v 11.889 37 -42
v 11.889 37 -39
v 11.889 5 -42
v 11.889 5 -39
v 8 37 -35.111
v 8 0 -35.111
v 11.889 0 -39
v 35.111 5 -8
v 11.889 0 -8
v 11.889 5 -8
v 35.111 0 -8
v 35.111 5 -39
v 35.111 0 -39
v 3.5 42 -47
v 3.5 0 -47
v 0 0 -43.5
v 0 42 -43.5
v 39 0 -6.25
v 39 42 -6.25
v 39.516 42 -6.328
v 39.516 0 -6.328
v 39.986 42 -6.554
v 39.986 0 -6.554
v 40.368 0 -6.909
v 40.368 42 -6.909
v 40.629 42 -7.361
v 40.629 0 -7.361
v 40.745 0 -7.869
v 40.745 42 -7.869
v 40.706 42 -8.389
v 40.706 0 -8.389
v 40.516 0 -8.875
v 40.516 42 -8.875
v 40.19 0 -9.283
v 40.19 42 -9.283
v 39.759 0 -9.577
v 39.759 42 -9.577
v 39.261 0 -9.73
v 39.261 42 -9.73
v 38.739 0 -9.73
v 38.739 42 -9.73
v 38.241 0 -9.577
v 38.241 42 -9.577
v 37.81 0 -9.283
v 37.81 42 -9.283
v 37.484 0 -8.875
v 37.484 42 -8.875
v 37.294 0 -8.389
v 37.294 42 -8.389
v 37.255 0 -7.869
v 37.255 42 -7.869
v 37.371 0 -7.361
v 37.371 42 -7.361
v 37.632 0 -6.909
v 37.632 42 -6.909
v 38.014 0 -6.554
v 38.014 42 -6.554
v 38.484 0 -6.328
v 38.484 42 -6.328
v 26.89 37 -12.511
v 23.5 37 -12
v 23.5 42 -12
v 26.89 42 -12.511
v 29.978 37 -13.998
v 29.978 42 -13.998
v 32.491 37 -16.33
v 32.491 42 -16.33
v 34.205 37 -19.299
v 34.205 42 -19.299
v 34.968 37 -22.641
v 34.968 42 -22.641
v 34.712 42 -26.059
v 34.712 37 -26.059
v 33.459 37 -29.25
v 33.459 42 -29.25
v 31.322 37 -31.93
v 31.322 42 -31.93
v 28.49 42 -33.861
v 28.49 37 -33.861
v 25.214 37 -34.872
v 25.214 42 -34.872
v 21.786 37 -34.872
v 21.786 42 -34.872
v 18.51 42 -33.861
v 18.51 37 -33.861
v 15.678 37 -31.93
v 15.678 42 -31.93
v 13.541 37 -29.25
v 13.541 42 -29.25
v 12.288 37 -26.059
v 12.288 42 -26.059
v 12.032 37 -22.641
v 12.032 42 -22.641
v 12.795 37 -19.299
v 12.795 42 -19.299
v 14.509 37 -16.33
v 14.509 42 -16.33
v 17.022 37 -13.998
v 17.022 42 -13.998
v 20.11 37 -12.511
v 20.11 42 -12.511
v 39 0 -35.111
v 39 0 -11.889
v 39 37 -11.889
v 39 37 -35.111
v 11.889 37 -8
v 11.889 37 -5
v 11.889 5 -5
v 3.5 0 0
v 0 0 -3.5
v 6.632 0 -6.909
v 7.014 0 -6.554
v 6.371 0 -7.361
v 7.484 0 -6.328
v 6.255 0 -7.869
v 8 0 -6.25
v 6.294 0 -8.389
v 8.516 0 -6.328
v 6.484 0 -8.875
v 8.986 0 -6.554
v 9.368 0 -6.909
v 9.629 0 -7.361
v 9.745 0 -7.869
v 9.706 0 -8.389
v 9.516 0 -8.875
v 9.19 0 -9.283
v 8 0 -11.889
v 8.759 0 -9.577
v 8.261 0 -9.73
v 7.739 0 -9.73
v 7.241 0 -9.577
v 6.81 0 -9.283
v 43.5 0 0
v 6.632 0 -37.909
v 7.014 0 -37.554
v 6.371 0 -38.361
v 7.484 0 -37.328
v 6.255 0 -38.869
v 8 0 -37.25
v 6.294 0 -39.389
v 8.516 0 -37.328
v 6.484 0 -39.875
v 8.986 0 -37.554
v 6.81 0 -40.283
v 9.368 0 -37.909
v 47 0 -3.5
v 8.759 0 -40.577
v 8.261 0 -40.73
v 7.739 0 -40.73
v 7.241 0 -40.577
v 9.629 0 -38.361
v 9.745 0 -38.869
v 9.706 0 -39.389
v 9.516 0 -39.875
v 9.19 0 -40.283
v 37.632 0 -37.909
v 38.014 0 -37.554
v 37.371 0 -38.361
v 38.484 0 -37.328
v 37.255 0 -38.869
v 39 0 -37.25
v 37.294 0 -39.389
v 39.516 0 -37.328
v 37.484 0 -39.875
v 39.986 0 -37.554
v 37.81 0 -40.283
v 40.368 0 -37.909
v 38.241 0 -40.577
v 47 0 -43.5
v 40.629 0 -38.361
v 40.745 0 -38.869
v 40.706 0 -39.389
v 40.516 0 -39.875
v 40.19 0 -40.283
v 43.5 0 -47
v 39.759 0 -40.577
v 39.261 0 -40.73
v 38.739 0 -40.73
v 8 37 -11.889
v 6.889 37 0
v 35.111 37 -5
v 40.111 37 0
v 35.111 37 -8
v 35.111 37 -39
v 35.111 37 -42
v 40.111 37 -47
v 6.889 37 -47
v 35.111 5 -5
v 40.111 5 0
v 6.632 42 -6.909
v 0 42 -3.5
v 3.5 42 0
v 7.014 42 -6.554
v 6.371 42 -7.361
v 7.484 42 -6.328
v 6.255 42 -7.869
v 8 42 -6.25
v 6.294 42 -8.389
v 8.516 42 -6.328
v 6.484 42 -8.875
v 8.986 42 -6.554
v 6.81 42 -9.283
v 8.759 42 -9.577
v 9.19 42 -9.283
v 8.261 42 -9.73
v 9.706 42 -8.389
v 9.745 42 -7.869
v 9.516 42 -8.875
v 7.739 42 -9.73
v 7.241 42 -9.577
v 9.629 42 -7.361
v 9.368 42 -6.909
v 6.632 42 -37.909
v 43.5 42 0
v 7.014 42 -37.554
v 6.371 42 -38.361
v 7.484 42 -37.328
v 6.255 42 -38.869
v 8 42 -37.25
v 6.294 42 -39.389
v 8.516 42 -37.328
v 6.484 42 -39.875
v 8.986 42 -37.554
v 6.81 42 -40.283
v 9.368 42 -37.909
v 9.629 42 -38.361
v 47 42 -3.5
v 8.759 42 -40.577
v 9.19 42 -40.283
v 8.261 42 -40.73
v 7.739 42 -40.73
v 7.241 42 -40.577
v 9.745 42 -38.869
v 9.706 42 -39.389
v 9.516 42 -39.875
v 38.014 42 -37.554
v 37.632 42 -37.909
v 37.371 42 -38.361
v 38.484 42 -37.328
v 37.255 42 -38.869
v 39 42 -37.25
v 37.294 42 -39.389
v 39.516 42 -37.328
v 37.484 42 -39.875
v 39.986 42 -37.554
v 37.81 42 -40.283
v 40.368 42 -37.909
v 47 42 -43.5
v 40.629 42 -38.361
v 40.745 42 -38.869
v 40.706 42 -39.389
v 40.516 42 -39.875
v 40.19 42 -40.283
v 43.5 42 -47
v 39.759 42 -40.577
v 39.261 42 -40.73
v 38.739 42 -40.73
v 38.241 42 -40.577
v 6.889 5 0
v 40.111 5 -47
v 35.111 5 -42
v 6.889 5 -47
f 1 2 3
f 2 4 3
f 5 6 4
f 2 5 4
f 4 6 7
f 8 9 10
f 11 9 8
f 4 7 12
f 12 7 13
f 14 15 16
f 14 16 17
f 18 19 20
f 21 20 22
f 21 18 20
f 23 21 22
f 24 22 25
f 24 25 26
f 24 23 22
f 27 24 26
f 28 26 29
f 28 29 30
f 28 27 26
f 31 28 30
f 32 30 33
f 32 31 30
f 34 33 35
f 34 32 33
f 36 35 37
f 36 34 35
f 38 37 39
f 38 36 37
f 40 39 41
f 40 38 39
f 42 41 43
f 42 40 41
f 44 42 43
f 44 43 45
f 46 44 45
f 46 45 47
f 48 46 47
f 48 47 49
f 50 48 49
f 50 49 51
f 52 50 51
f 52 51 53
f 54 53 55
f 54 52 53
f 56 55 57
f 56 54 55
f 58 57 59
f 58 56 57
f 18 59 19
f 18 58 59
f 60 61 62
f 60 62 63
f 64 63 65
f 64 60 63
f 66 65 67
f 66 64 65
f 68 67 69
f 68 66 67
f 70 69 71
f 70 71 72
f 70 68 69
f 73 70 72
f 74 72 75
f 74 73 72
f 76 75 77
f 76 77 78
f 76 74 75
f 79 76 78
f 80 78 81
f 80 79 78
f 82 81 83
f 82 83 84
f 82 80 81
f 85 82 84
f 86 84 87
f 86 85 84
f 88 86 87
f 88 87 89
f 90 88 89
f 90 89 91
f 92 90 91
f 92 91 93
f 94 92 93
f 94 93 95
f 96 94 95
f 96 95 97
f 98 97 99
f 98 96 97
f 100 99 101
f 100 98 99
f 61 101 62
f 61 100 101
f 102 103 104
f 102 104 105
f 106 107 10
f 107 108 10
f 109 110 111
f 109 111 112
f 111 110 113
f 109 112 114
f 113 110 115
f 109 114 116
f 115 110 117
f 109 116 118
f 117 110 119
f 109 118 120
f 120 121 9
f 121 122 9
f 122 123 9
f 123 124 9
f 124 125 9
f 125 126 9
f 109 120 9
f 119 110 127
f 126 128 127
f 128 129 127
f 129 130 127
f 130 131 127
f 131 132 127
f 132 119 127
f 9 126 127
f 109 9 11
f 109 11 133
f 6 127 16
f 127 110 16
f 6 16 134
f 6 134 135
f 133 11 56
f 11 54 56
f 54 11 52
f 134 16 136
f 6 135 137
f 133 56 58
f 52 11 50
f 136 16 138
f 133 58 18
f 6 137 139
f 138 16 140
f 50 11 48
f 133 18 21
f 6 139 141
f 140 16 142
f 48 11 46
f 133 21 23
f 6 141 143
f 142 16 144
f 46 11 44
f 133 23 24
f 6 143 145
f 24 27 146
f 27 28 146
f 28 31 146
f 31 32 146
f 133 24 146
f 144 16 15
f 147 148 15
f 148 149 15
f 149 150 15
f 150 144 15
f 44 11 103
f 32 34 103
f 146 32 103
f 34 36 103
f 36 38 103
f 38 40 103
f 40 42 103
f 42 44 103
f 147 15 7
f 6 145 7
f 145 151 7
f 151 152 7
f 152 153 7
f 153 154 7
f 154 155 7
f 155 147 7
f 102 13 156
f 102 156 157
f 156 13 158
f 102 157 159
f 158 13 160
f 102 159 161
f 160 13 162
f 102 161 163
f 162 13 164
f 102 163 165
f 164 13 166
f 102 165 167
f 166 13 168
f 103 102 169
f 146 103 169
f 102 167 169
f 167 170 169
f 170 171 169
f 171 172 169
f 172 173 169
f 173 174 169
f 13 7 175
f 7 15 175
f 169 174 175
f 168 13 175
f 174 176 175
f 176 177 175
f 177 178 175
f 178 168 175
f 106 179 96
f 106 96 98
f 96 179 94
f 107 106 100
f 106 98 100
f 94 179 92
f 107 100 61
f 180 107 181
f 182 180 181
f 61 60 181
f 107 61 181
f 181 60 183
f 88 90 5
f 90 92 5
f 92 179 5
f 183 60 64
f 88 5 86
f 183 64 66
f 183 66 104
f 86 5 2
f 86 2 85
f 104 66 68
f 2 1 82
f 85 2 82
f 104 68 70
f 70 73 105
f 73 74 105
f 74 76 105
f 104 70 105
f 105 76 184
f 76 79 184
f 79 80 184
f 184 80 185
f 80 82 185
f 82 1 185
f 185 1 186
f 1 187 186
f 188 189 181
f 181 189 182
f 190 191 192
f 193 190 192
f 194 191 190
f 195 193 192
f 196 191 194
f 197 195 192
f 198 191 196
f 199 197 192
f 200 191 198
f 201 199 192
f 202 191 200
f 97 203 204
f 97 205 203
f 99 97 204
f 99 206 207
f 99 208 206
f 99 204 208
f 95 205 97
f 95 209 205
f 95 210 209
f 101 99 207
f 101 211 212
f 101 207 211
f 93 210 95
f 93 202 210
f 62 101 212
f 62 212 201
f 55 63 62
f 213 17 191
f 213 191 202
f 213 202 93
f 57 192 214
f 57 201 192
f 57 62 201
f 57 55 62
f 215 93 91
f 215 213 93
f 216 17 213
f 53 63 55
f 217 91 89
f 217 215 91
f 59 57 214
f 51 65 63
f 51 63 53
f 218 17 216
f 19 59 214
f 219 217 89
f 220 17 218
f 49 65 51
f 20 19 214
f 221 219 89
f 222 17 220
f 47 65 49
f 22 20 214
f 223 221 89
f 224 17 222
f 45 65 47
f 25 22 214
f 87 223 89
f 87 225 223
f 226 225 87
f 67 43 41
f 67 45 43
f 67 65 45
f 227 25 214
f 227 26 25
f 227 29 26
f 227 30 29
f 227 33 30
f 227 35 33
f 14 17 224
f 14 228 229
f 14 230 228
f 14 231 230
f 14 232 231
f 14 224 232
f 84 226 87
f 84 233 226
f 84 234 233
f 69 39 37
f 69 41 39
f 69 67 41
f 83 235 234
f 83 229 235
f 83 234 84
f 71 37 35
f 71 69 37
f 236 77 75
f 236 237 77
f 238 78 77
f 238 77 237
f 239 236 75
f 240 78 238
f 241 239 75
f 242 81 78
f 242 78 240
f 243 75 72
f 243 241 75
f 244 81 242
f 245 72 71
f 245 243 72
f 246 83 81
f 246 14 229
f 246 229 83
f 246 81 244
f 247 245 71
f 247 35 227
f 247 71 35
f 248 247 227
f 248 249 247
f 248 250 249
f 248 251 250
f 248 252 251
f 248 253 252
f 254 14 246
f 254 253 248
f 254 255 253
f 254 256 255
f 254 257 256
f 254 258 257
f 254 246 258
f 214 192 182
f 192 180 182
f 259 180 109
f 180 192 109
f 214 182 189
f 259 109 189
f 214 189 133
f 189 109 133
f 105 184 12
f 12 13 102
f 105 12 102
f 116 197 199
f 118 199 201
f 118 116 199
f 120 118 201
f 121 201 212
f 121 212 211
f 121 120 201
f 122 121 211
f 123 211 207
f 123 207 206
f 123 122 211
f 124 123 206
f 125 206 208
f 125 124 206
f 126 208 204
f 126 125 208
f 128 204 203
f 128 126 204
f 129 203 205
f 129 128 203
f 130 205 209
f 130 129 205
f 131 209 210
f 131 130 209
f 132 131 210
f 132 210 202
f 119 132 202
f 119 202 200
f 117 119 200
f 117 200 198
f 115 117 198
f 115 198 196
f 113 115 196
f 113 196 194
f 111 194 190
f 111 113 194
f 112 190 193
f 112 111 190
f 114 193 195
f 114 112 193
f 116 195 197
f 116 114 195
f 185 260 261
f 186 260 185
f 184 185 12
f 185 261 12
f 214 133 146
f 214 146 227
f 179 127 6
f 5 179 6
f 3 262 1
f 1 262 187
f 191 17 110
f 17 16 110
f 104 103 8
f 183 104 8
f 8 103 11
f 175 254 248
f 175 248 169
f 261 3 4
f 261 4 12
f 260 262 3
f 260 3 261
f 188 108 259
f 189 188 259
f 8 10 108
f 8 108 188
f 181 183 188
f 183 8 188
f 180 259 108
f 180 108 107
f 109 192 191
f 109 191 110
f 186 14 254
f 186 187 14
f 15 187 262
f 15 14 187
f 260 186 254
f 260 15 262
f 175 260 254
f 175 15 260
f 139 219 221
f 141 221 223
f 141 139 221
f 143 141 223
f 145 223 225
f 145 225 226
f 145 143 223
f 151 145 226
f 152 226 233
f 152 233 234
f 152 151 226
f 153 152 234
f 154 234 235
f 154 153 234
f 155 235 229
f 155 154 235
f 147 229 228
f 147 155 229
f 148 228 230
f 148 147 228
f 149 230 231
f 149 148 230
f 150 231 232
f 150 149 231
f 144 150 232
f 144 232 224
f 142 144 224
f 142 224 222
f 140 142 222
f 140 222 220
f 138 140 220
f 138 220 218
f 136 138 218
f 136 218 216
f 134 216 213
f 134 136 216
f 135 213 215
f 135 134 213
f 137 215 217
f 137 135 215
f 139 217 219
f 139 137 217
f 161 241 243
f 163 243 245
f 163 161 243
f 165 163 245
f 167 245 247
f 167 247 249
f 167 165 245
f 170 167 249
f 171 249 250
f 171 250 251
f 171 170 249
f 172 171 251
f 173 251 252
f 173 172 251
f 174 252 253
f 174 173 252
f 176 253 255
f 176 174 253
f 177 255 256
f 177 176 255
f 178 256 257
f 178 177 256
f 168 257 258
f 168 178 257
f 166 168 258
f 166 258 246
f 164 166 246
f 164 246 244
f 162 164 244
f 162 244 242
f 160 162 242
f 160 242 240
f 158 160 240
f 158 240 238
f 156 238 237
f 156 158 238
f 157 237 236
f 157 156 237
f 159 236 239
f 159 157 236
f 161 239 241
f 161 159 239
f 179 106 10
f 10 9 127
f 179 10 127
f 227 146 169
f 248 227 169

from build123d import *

# Parameters (mm, degrees)
SKETCH1_R           = 1.75
SKETCH1_W           = 8
SKETCH1_H           = 23.221825406
SKETCH1_W_2         = 23.221825406
SKETCH1_H_2         = 8
BOSS_EXTRUDE1_DEPTH = 5
SKETCH1_3_R         = 1.75
SKETCH1_3_W         = 8
SKETCH1_3_H         = 23.221825406
BOSS_EXTRUDE2_DEPTH = 42
BOSS_EXTRUDE3_START = 37
SKETCH1_4_R         = 11.5
SKETCH1_4_W         = 23.221825406
SKETCH1_4_H         = 8
SKETCH1_4_R_2       = 1.75
SKETCH1_4_W_2       = 8
SKETCH1_4_H_2       = 23.221825406
BOSS_EXTRUDE3_DEPTH = 5
CHAMFER2_SIZE       = 5
CHAMFER4_SIZE       = 3.5


with BuildPart() as part:
    # Sketch1 → Boss-Extrude1 (new body)
    # profile 1 of 8: a face of its own
    with BuildSketch(Plane(origin=(0, 0, 0), x_dir=(1, 0, 0), z_dir=(0, 1, 0))):
        Polygon((0, 47), (0, 35.110912703), (8, 35.110912703), (11.889087297, 39), (11.889087297, 47), align=None)
        with Locations(Location((8, 39, 0), (0, 0, 270))):
            Circle(SKETCH1_R, mode=Mode.SUBTRACT)
    # profile 2 of 8: a face of its own
    with BuildSketch(Plane(origin=(0, 0, 0), x_dir=(1, 0, 0), z_dir=(0, 1, 0))):
        with Locations((4, 23.5)):
            Rectangle(SKETCH1_W, SKETCH1_H)
    # profile 3 of 8: a face of its own
    with BuildSketch(Plane(origin=(0, 0, 0), x_dir=(1, 0, 0), z_dir=(0, 1, 0))):
        Polygon((0, 11.889087297), (0, 0), (11.889087297, 0), (11.889087297, 8), (8, 11.889087297), align=None)
        with Locations(Location((8, 8, 0), (0, 0, 270))):
            Circle(SKETCH1_R, mode=Mode.SUBTRACT)
    # profile 4 of 8: a face of its own
    with BuildSketch(Plane(origin=(0, 0, 0), x_dir=(1, 0, 0), z_dir=(0, 1, 0))):
        with Locations((23.5, 4)):
            Rectangle(SKETCH1_W_2, SKETCH1_H_2)
    # profile 5 of 8: a face of its own
    with BuildSketch(Plane(origin=(0, 0, 0), x_dir=(1, 0, 0), z_dir=(0, 1, 0))):
        Polygon((35.110912703, 8), (35.110912703, 0), (47, 0), (47, 11.889087297), (39, 11.889087297), align=None)
        with Locations(Location((39, 8, 0), (0, 0, 270))):
            Circle(SKETCH1_R, mode=Mode.SUBTRACT)
    # profile 6 of 8: a face of its own
    with BuildSketch(Plane(origin=(0, 0, 0), x_dir=(1, 0, 0), z_dir=(0, 1, 0))):
        with Locations((43, 23.5)):
            Rectangle(SKETCH1_W, SKETCH1_H)
    # profile 7 of 8: a face of its own
    with BuildSketch(Plane(origin=(0, 0, 0), x_dir=(1, 0, 0), z_dir=(0, 1, 0))):
        Polygon((39, 35.110912703), (47, 35.110912703), (47, 47), (35.110912703, 47), (35.110912703, 39), align=None)
        with Locations(Location((39, 39, 0), (0, 0, 270))):
            Circle(SKETCH1_R, mode=Mode.SUBTRACT)
    # profile 8 of 8: a face of its own
    with BuildSketch(Plane(origin=(0, 0, 0), x_dir=(1, 0, 0), z_dir=(0, 1, 0))):
        with Locations((23.5, 43)):
            Rectangle(SKETCH1_W_2, SKETCH1_H_2)
    extrude(amount=BOSS_EXTRUDE1_DEPTH)

    # Sketch1<3> → Boss-Extrude2 (add)
    # profile 1 of 6: a face of its own
    with BuildSketch(Plane(origin=(0, 0, 0), x_dir=(1, 0, 0), z_dir=(0, 1, 0))):
        Polygon((0, 11.889087297), (0, 0), (11.889087297, 0), (11.889087297, 8), (8, 11.889087297), align=None)
        with Locations(Location((8, 8, 0), (0, 0, 270))):
            Circle(SKETCH1_3_R, mode=Mode.SUBTRACT)
    # profile 2 of 6: a face of its own
    with BuildSketch(Plane(origin=(0, 0, 0), x_dir=(1, 0, 0), z_dir=(0, 1, 0))):
        Polygon((0, 47), (0, 35.110912703), (8, 35.110912703), (11.889087297, 39), (11.889087297, 47), align=None)
        with Locations(Location((8, 39, 0), (0, 0, 270))):
            Circle(SKETCH1_3_R, mode=Mode.SUBTRACT)
    # profile 3 of 6: a face of its own
    with BuildSketch(Plane(origin=(0, 0, 0), x_dir=(1, 0, 0), z_dir=(0, 1, 0))):
        Polygon((39, 35.110912703), (47, 35.110912703), (47, 47), (35.110912703, 47), (35.110912703, 39), align=None)
        with Locations(Location((39, 39, 0), (0, 0, 270))):
            Circle(SKETCH1_3_R, mode=Mode.SUBTRACT)
    # profile 4 of 6: a face of its own
    with BuildSketch(Plane(origin=(0, 0, 0), x_dir=(1, 0, 0), z_dir=(0, 1, 0))):
        Polygon((35.110912703, 8), (35.110912703, 0), (47, 0), (47, 11.889087297), (39, 11.889087297), align=None)
        with Locations(Location((39, 8, 0), (0, 0, 270))):
            Circle(SKETCH1_3_R, mode=Mode.SUBTRACT)
    # profile 5 of 6: a face of its own
    with BuildSketch(Plane(origin=(0, 0, 0), x_dir=(1, 0, 0), z_dir=(0, 1, 0))):
        with Locations((4, 23.5)):
            Rectangle(SKETCH1_3_W, SKETCH1_3_H)
    # profile 6 of 6: a face of its own
    with BuildSketch(Plane(origin=(0, 0, 0), x_dir=(1, 0, 0), z_dir=(0, 1, 0))):
        with Locations((43, 23.5)):
            Rectangle(SKETCH1_3_W, SKETCH1_3_H)
    extrude(amount=BOSS_EXTRUDE2_DEPTH)

    # Sketch1<4> → Boss-Extrude3 (add)
    # profile 1 of 9: a face of its own
    with BuildSketch(Plane(origin=(0, 0, 0), x_dir=(1, 0, 0), z_dir=(0, 1, 0)).offset(BOSS_EXTRUDE3_START)):
        Polygon((11.889087297, 39), (8, 35.110912703), (8, 11.889087297), (11.889087297, 8), (35.110912703, 8), (39, 11.889087297), (39, 35.110912703), (35.110912703, 39), align=None)
        with Locations(Location((23.5, 23.5, 0), (0, 0, 270))):
            Circle(SKETCH1_4_R, mode=Mode.SUBTRACT)
    # profile 2 of 9: a face of its own
    with BuildSketch(Plane(origin=(0, 0, 0), x_dir=(1, 0, 0), z_dir=(0, 1, 0)).offset(BOSS_EXTRUDE3_START)):
        with Locations((23.5, 43)):
            Rectangle(SKETCH1_4_W, SKETCH1_4_H)
    # profile 3 of 9: a face of its own
    with BuildSketch(Plane(origin=(0, 0, 0), x_dir=(1, 0, 0), z_dir=(0, 1, 0)).offset(BOSS_EXTRUDE3_START)):
        Polygon((0, 47), (0, 35.110912703), (8, 35.110912703), (11.889087297, 39), (11.889087297, 47), align=None)
        with Locations(Location((8, 39, 0), (0, 0, 270))):
            Circle(SKETCH1_4_R_2, mode=Mode.SUBTRACT)
    # profile 4 of 9: a face of its own
    with BuildSketch(Plane(origin=(0, 0, 0), x_dir=(1, 0, 0), z_dir=(0, 1, 0)).offset(BOSS_EXTRUDE3_START)):
        with Locations((4, 23.5)):
            Rectangle(SKETCH1_4_W_2, SKETCH1_4_H_2)
    # profile 5 of 9: a face of its own
    with BuildSketch(Plane(origin=(0, 0, 0), x_dir=(1, 0, 0), z_dir=(0, 1, 0)).offset(BOSS_EXTRUDE3_START)):
        Polygon((0, 11.889087297), (0, 0), (11.889087297, 0), (11.889087297, 8), (8, 11.889087297), align=None)
        with Locations(Location((8, 8, 0), (0, 0, 270))):
            Circle(SKETCH1_4_R_2, mode=Mode.SUBTRACT)
    # profile 6 of 9: a face of its own
    with BuildSketch(Plane(origin=(0, 0, 0), x_dir=(1, 0, 0), z_dir=(0, 1, 0)).offset(BOSS_EXTRUDE3_START)):
        with Locations((23.5, 4)):
            Rectangle(SKETCH1_4_W, SKETCH1_4_H)
    # profile 7 of 9: a face of its own
    with BuildSketch(Plane(origin=(0, 0, 0), x_dir=(1, 0, 0), z_dir=(0, 1, 0)).offset(BOSS_EXTRUDE3_START)):
        Polygon((35.110912703, 8), (35.110912703, 0), (47, 0), (47, 11.889087297), (39, 11.889087297), align=None)
        with Locations(Location((39, 8, 0), (0, 0, 270))):
            Circle(SKETCH1_4_R_2, mode=Mode.SUBTRACT)
    # profile 8 of 9: a face of its own
    with BuildSketch(Plane(origin=(0, 0, 0), x_dir=(1, 0, 0), z_dir=(0, 1, 0)).offset(BOSS_EXTRUDE3_START)):
        with Locations((43, 23.5)):
            Rectangle(SKETCH1_4_W_2, SKETCH1_4_H_2)
    # profile 9 of 9: a face of its own
    with BuildSketch(Plane(origin=(0, 0, 0), x_dir=(1, 0, 0), z_dir=(0, 1, 0)).offset(BOSS_EXTRUDE3_START)):
        Polygon((39, 35.110912703), (47, 35.110912703), (47, 47), (35.110912703, 47), (35.110912703, 39), align=None)
        with Locations(Location((39, 39, 0), (0, 0, 270))):
            Circle(SKETCH1_4_R_2, mode=Mode.SUBTRACT)
    extrude(amount=BOSS_EXTRUDE3_DEPTH)

    # Chamfer2
    chamfer2_edges = [part.edges().sort_by_distance(p)[0] for p in [
        (35.110912703, 21, -47),
        (35.110912703, 21, 0),
        (11.889087297, 21, 0),
        (11.889087297, 21, -47),
    ]]
    chamfer(chamfer2_edges, length=CHAMFER2_SIZE)

    # Chamfer4
    chamfer4_edges = [part.edges().sort_by_distance(p)[0] for p in [
        (0, 21, 0),
        (0, 21, -47),
        (47, 21, -47),
        (47, 21, 0),
    ]]
    chamfer(chamfer4_edges, length=CHAMFER4_SIZE)


solid = part.part
